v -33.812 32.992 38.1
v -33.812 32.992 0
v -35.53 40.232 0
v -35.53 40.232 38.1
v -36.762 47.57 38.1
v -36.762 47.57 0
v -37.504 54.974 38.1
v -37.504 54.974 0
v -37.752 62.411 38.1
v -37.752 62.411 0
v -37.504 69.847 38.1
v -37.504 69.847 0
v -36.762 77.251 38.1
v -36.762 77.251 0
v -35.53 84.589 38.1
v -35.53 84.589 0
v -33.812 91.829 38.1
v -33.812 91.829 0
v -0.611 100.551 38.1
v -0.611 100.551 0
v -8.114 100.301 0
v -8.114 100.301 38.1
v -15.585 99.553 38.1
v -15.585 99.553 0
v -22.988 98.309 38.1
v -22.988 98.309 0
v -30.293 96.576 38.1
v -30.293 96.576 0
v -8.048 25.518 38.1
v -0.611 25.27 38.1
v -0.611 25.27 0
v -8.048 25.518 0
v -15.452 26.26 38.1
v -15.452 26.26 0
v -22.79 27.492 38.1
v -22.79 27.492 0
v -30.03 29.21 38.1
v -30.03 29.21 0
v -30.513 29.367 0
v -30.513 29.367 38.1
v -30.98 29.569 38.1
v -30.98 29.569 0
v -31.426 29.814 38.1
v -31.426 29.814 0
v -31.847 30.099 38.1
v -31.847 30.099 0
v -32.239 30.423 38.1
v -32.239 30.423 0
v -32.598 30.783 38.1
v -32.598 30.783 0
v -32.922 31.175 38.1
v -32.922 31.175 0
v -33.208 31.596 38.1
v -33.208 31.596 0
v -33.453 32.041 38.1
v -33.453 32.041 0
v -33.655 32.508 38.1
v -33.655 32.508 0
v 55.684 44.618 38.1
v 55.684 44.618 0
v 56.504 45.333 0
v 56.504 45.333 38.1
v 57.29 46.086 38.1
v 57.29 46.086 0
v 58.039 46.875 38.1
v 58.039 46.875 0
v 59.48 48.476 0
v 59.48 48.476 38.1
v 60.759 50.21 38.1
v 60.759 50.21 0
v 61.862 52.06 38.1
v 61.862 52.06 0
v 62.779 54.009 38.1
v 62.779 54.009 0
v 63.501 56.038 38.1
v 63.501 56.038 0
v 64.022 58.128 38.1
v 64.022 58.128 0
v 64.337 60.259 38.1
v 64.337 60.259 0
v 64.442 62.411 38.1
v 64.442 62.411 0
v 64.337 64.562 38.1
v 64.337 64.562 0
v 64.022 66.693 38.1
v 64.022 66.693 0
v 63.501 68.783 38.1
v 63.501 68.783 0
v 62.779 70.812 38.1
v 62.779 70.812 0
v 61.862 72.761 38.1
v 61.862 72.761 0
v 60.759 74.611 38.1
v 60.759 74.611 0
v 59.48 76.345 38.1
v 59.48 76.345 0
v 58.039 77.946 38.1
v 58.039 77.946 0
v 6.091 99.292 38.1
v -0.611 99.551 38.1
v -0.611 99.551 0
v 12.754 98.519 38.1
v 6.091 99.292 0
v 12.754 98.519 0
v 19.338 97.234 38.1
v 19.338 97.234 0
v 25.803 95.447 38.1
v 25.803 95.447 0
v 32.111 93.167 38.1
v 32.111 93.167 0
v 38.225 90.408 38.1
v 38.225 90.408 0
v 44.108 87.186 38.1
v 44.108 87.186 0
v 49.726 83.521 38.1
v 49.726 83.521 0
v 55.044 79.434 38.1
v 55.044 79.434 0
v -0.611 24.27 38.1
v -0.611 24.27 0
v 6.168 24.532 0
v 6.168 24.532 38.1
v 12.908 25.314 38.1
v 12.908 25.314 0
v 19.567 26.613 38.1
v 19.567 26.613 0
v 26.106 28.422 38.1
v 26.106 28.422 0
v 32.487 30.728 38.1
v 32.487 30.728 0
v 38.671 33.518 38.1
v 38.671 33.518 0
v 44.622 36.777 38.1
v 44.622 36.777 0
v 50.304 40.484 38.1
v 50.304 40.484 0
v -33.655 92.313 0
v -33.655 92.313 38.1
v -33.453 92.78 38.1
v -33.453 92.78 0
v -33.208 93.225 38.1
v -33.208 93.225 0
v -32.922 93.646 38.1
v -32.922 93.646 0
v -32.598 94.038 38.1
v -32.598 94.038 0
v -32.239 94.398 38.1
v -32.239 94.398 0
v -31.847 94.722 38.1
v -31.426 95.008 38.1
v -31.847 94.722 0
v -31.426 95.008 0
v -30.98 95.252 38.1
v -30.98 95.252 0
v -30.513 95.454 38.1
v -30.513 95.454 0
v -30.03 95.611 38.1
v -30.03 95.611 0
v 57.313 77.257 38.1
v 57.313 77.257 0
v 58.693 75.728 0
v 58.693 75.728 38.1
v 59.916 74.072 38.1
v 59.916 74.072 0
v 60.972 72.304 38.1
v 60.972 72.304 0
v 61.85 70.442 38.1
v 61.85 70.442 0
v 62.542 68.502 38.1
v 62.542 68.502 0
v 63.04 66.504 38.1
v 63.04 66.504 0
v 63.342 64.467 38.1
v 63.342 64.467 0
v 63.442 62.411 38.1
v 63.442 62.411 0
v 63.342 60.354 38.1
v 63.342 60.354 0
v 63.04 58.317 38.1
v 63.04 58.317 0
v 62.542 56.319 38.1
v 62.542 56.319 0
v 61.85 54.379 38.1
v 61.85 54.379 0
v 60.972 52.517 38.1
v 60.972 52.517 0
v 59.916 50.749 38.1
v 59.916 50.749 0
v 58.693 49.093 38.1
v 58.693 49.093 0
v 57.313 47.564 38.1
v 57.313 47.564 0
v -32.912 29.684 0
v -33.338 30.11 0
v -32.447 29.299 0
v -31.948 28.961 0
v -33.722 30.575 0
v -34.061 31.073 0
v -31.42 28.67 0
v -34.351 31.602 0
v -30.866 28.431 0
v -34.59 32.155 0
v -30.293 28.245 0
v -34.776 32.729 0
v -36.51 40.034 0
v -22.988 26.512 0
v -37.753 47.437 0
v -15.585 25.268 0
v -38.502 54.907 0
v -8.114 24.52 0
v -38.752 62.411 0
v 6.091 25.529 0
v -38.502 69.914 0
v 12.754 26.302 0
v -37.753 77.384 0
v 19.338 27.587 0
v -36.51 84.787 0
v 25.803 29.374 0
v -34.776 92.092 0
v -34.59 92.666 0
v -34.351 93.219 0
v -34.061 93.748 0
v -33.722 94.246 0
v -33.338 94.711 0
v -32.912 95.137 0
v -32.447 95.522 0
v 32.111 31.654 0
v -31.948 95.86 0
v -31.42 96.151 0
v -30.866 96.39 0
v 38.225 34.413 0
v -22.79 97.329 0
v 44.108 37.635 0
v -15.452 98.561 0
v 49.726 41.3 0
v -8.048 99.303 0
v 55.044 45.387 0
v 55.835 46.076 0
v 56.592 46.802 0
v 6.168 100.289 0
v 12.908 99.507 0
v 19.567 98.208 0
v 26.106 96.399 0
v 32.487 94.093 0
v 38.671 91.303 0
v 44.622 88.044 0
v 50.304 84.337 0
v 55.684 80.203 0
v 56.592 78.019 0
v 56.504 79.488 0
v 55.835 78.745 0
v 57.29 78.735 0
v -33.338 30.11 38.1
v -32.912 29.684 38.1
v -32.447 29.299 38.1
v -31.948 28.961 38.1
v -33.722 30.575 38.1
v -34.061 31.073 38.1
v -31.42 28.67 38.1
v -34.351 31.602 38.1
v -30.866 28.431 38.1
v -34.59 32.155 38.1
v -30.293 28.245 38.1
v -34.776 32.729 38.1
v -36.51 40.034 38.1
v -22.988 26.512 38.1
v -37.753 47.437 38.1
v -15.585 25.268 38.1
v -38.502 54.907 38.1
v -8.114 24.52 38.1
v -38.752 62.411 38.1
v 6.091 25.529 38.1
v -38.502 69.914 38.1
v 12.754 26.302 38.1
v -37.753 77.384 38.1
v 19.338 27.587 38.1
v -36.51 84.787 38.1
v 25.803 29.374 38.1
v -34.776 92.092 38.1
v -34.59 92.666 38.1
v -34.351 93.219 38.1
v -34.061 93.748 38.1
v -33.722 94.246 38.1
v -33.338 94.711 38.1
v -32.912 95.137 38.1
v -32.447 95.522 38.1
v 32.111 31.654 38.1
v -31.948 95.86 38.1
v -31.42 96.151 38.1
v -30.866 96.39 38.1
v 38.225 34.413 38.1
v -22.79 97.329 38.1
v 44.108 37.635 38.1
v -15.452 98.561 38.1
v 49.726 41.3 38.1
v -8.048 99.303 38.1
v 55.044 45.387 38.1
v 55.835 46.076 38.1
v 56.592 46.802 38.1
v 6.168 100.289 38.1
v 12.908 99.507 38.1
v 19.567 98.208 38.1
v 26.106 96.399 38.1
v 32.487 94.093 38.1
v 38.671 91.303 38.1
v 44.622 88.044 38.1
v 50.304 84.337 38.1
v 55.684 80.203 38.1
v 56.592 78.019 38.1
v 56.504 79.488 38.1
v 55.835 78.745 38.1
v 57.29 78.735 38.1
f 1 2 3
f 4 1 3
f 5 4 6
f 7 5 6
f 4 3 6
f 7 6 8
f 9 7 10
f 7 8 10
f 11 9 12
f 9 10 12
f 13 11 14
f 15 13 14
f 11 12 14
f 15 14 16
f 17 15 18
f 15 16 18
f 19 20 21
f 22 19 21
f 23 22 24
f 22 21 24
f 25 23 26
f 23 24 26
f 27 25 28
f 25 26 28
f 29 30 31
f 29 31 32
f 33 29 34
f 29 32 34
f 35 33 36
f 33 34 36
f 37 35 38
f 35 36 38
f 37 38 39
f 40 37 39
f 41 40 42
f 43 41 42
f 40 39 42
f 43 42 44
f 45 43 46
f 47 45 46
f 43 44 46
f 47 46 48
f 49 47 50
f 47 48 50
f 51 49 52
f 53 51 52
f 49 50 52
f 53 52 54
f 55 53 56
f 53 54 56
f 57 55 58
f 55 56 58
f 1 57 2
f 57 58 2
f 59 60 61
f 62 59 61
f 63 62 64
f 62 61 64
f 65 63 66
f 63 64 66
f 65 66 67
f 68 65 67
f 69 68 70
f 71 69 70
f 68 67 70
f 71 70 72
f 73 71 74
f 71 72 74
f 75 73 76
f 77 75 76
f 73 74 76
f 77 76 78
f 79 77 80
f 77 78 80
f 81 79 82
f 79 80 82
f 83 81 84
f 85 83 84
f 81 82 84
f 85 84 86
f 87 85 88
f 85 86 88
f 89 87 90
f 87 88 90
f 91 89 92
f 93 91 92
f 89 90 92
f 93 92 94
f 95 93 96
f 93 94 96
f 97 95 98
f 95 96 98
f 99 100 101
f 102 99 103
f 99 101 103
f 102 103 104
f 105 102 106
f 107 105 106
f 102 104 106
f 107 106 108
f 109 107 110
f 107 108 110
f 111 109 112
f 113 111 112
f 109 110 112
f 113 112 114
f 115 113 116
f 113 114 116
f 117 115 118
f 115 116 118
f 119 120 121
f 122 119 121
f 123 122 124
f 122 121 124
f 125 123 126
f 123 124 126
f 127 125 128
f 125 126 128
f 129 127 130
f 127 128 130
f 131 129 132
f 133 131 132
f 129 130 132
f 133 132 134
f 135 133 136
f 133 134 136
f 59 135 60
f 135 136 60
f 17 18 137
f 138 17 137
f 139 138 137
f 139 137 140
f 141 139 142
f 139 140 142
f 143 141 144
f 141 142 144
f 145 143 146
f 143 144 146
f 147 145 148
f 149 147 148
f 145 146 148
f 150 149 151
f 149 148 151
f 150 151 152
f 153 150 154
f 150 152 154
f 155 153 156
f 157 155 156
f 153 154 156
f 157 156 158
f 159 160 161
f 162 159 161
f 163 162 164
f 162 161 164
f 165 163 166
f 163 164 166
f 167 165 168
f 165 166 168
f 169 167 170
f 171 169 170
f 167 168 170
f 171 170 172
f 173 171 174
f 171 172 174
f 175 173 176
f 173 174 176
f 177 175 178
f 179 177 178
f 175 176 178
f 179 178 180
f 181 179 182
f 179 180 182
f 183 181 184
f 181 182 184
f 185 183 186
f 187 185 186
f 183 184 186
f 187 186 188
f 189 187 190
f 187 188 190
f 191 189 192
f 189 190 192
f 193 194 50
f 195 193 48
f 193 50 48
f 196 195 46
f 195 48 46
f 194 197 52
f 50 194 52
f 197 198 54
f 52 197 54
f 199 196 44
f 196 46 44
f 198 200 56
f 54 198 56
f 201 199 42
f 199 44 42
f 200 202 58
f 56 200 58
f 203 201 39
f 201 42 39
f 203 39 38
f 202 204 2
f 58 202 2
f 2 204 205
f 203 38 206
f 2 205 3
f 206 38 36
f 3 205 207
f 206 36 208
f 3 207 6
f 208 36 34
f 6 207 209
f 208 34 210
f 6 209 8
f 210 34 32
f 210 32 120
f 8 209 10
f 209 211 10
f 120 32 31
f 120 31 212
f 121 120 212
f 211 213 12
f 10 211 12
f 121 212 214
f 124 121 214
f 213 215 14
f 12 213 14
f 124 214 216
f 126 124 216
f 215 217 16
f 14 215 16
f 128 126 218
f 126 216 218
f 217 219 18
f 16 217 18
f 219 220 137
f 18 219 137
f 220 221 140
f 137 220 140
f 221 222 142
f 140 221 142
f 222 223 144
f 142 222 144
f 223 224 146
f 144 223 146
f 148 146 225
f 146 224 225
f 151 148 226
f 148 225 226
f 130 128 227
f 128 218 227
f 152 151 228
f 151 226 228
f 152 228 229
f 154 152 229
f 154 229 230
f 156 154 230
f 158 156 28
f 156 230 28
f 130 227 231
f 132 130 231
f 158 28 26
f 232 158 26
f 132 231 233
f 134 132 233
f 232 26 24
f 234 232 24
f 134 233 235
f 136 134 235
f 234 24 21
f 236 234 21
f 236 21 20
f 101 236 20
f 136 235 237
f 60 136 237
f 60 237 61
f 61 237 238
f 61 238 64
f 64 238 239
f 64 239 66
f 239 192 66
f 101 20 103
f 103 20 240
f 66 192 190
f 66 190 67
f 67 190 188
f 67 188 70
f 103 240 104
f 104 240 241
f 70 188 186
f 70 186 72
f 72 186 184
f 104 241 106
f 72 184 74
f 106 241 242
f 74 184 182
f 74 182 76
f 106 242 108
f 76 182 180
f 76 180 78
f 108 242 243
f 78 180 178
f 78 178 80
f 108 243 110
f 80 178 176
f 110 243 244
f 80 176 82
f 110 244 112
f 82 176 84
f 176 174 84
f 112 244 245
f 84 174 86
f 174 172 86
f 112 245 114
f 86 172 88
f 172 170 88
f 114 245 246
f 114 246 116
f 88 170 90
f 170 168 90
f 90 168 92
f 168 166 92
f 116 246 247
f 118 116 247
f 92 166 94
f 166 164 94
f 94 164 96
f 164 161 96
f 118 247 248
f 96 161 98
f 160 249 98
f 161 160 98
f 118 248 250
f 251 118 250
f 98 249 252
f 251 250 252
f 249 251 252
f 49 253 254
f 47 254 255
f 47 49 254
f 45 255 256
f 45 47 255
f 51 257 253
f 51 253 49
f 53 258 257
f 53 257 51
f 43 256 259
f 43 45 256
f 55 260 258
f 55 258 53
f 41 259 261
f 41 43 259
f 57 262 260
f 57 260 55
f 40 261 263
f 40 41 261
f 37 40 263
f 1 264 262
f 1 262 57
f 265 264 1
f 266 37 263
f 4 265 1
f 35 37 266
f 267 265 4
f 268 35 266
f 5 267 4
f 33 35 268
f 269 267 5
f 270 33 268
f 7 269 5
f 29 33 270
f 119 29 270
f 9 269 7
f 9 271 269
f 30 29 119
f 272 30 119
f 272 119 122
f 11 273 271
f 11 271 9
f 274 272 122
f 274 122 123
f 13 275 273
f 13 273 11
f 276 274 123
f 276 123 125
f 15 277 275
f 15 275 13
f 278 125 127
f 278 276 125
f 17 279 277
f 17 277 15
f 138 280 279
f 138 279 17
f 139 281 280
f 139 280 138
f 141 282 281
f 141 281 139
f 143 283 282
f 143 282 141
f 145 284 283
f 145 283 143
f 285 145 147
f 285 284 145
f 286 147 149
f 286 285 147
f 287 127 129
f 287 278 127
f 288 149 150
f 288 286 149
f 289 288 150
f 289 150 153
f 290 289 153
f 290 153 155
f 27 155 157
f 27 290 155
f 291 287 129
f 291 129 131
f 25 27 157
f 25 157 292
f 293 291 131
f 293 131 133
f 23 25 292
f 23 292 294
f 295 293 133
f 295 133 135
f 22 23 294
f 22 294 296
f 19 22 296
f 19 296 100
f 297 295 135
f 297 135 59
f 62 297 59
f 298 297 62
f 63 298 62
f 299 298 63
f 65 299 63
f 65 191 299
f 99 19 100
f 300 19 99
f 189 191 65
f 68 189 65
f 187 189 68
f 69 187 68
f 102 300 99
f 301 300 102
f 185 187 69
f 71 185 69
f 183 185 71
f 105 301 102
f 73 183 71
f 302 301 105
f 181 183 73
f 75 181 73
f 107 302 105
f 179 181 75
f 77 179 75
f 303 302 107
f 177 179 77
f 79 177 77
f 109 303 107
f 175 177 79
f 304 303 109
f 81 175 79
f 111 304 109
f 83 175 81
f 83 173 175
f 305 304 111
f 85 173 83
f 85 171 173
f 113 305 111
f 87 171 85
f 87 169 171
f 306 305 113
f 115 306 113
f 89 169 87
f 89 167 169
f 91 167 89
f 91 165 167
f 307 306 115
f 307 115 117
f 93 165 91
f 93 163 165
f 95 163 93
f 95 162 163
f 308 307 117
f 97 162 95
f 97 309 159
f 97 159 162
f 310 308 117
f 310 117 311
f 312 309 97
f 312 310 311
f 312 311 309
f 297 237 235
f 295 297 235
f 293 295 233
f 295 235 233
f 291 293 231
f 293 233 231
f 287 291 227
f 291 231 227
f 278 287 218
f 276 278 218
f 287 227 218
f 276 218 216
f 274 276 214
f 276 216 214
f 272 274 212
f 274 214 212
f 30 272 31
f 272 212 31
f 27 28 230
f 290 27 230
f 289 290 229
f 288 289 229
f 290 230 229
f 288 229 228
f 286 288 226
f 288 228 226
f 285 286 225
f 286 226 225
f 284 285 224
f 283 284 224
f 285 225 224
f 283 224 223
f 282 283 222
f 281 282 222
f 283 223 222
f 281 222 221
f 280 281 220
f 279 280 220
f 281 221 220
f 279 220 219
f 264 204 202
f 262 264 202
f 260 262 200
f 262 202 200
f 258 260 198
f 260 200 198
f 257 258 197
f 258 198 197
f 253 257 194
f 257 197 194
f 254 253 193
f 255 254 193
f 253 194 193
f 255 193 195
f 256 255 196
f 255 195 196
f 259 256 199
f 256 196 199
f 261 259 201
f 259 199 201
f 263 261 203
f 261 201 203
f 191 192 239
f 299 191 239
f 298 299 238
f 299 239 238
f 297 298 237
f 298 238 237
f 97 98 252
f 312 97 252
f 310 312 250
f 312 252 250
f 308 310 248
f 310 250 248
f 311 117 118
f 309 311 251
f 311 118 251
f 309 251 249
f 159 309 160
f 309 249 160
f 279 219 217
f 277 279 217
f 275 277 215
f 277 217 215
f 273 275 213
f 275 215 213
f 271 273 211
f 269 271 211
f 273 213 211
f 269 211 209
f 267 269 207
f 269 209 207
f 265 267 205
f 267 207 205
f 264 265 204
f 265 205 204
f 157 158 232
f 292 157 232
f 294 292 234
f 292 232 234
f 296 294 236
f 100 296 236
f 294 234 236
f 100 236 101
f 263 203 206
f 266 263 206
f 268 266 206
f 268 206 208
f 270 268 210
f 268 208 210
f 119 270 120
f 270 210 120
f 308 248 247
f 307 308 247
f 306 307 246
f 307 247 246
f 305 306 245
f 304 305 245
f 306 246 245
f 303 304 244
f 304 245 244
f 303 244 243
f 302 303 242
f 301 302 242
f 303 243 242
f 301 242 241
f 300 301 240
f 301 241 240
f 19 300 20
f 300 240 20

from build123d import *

# Parameters (mm, degrees)
EXTRUDE_1_DEPTH = 38.1


with BuildPart() as part:
    # Эскиз1 → Бобышка-Вытянуть1 (new body)
    with BuildSketch(Plane.XY):
        with BuildLine():
            ThreePointArc((58.039129224, 77.945655108), (56.901327597, 79.116004883), (55.683853915, 80.203234837))
            ThreePointArc((55.683853915, 80.203234837), (29.318529457, 95.307848832), (-0.611231214, 100.550855968))
            ThreePointArc((-0.611231214, 100.550855968), (-15.584507099, 99.552637576), (-30.292769251, 96.575649981))
            ThreePointArc((-30.292769251, 96.575649981), (-33.129887493, 94.929167254), (-34.776370221, 92.092049011))
            ThreePointArc((-34.776370221, 92.092049011), (-38.751576208, 62.410510975), (-34.776370221, 32.728972938))
            ThreePointArc((-34.776370221, 32.728972938), (-33.129887493, 29.891854696), (-30.29276925, 28.245371968))
            ThreePointArc((-30.29276925, 28.245371968), (-15.584507098, 25.268384374), (-0.611231214, 24.270165982))
            ThreePointArc((-0.611231214, 24.270165982), (29.318529457, 29.513173118), (55.683853915, 44.617787113))
            ThreePointArc((55.683853915, 44.617787113), (56.901327595, 45.705017068), (58.039129224, 46.875366842))
            ThreePointArc((58.039129224, 46.875366842), (64.442309074, 62.410510975), (58.039129224, 77.945655108))
        make_face()
        with BuildLine():
            ThreePointArc((57.313391253, 77.25728346), (63.442309074, 62.410510975), (57.313391253, 47.56373849))
            ThreePointArc((57.313391253, 47.56373849), (56.217638563, 46.434884922), (55.04449071, 45.386691978))
            ThreePointArc((55.04449071, 45.386691978), (28.978606573, 30.453626431), (-0.611231214, 25.270165982))
            ThreePointArc((-0.611231214, 25.270165982), (-15.451763735, 26.259534816), (-30.029631964, 29.210130367))
            ThreePointArc((-30.029631964, 29.210130367), (-32.422780711, 30.598961477), (-33.811611821, 32.992110224))
            ThreePointArc((-33.811611821, 32.992110224), (-37.751576208, 62.410510974), (-33.811611822, 91.828911725))
            ThreePointArc((-33.811611822, 91.828911725), (-32.422780712, 94.222060472), (-30.029631965, 95.610891582))
            ThreePointArc((-30.029631965, 95.610891582), (-15.451763736, 98.561487134), (-0.611231214, 99.550855968))
            ThreePointArc((-0.611231214, 99.550855968), (28.978606573, 94.367395519), (55.04449071, 79.434329972))
            ThreePointArc((55.04449071, 79.434329972), (56.217638563, 78.386137027), (57.313391253, 77.25728346))
        make_face(mode=Mode.SUBTRACT)
    extrude(amount=EXTRUDE_1_DEPTH)


solid = part.part
